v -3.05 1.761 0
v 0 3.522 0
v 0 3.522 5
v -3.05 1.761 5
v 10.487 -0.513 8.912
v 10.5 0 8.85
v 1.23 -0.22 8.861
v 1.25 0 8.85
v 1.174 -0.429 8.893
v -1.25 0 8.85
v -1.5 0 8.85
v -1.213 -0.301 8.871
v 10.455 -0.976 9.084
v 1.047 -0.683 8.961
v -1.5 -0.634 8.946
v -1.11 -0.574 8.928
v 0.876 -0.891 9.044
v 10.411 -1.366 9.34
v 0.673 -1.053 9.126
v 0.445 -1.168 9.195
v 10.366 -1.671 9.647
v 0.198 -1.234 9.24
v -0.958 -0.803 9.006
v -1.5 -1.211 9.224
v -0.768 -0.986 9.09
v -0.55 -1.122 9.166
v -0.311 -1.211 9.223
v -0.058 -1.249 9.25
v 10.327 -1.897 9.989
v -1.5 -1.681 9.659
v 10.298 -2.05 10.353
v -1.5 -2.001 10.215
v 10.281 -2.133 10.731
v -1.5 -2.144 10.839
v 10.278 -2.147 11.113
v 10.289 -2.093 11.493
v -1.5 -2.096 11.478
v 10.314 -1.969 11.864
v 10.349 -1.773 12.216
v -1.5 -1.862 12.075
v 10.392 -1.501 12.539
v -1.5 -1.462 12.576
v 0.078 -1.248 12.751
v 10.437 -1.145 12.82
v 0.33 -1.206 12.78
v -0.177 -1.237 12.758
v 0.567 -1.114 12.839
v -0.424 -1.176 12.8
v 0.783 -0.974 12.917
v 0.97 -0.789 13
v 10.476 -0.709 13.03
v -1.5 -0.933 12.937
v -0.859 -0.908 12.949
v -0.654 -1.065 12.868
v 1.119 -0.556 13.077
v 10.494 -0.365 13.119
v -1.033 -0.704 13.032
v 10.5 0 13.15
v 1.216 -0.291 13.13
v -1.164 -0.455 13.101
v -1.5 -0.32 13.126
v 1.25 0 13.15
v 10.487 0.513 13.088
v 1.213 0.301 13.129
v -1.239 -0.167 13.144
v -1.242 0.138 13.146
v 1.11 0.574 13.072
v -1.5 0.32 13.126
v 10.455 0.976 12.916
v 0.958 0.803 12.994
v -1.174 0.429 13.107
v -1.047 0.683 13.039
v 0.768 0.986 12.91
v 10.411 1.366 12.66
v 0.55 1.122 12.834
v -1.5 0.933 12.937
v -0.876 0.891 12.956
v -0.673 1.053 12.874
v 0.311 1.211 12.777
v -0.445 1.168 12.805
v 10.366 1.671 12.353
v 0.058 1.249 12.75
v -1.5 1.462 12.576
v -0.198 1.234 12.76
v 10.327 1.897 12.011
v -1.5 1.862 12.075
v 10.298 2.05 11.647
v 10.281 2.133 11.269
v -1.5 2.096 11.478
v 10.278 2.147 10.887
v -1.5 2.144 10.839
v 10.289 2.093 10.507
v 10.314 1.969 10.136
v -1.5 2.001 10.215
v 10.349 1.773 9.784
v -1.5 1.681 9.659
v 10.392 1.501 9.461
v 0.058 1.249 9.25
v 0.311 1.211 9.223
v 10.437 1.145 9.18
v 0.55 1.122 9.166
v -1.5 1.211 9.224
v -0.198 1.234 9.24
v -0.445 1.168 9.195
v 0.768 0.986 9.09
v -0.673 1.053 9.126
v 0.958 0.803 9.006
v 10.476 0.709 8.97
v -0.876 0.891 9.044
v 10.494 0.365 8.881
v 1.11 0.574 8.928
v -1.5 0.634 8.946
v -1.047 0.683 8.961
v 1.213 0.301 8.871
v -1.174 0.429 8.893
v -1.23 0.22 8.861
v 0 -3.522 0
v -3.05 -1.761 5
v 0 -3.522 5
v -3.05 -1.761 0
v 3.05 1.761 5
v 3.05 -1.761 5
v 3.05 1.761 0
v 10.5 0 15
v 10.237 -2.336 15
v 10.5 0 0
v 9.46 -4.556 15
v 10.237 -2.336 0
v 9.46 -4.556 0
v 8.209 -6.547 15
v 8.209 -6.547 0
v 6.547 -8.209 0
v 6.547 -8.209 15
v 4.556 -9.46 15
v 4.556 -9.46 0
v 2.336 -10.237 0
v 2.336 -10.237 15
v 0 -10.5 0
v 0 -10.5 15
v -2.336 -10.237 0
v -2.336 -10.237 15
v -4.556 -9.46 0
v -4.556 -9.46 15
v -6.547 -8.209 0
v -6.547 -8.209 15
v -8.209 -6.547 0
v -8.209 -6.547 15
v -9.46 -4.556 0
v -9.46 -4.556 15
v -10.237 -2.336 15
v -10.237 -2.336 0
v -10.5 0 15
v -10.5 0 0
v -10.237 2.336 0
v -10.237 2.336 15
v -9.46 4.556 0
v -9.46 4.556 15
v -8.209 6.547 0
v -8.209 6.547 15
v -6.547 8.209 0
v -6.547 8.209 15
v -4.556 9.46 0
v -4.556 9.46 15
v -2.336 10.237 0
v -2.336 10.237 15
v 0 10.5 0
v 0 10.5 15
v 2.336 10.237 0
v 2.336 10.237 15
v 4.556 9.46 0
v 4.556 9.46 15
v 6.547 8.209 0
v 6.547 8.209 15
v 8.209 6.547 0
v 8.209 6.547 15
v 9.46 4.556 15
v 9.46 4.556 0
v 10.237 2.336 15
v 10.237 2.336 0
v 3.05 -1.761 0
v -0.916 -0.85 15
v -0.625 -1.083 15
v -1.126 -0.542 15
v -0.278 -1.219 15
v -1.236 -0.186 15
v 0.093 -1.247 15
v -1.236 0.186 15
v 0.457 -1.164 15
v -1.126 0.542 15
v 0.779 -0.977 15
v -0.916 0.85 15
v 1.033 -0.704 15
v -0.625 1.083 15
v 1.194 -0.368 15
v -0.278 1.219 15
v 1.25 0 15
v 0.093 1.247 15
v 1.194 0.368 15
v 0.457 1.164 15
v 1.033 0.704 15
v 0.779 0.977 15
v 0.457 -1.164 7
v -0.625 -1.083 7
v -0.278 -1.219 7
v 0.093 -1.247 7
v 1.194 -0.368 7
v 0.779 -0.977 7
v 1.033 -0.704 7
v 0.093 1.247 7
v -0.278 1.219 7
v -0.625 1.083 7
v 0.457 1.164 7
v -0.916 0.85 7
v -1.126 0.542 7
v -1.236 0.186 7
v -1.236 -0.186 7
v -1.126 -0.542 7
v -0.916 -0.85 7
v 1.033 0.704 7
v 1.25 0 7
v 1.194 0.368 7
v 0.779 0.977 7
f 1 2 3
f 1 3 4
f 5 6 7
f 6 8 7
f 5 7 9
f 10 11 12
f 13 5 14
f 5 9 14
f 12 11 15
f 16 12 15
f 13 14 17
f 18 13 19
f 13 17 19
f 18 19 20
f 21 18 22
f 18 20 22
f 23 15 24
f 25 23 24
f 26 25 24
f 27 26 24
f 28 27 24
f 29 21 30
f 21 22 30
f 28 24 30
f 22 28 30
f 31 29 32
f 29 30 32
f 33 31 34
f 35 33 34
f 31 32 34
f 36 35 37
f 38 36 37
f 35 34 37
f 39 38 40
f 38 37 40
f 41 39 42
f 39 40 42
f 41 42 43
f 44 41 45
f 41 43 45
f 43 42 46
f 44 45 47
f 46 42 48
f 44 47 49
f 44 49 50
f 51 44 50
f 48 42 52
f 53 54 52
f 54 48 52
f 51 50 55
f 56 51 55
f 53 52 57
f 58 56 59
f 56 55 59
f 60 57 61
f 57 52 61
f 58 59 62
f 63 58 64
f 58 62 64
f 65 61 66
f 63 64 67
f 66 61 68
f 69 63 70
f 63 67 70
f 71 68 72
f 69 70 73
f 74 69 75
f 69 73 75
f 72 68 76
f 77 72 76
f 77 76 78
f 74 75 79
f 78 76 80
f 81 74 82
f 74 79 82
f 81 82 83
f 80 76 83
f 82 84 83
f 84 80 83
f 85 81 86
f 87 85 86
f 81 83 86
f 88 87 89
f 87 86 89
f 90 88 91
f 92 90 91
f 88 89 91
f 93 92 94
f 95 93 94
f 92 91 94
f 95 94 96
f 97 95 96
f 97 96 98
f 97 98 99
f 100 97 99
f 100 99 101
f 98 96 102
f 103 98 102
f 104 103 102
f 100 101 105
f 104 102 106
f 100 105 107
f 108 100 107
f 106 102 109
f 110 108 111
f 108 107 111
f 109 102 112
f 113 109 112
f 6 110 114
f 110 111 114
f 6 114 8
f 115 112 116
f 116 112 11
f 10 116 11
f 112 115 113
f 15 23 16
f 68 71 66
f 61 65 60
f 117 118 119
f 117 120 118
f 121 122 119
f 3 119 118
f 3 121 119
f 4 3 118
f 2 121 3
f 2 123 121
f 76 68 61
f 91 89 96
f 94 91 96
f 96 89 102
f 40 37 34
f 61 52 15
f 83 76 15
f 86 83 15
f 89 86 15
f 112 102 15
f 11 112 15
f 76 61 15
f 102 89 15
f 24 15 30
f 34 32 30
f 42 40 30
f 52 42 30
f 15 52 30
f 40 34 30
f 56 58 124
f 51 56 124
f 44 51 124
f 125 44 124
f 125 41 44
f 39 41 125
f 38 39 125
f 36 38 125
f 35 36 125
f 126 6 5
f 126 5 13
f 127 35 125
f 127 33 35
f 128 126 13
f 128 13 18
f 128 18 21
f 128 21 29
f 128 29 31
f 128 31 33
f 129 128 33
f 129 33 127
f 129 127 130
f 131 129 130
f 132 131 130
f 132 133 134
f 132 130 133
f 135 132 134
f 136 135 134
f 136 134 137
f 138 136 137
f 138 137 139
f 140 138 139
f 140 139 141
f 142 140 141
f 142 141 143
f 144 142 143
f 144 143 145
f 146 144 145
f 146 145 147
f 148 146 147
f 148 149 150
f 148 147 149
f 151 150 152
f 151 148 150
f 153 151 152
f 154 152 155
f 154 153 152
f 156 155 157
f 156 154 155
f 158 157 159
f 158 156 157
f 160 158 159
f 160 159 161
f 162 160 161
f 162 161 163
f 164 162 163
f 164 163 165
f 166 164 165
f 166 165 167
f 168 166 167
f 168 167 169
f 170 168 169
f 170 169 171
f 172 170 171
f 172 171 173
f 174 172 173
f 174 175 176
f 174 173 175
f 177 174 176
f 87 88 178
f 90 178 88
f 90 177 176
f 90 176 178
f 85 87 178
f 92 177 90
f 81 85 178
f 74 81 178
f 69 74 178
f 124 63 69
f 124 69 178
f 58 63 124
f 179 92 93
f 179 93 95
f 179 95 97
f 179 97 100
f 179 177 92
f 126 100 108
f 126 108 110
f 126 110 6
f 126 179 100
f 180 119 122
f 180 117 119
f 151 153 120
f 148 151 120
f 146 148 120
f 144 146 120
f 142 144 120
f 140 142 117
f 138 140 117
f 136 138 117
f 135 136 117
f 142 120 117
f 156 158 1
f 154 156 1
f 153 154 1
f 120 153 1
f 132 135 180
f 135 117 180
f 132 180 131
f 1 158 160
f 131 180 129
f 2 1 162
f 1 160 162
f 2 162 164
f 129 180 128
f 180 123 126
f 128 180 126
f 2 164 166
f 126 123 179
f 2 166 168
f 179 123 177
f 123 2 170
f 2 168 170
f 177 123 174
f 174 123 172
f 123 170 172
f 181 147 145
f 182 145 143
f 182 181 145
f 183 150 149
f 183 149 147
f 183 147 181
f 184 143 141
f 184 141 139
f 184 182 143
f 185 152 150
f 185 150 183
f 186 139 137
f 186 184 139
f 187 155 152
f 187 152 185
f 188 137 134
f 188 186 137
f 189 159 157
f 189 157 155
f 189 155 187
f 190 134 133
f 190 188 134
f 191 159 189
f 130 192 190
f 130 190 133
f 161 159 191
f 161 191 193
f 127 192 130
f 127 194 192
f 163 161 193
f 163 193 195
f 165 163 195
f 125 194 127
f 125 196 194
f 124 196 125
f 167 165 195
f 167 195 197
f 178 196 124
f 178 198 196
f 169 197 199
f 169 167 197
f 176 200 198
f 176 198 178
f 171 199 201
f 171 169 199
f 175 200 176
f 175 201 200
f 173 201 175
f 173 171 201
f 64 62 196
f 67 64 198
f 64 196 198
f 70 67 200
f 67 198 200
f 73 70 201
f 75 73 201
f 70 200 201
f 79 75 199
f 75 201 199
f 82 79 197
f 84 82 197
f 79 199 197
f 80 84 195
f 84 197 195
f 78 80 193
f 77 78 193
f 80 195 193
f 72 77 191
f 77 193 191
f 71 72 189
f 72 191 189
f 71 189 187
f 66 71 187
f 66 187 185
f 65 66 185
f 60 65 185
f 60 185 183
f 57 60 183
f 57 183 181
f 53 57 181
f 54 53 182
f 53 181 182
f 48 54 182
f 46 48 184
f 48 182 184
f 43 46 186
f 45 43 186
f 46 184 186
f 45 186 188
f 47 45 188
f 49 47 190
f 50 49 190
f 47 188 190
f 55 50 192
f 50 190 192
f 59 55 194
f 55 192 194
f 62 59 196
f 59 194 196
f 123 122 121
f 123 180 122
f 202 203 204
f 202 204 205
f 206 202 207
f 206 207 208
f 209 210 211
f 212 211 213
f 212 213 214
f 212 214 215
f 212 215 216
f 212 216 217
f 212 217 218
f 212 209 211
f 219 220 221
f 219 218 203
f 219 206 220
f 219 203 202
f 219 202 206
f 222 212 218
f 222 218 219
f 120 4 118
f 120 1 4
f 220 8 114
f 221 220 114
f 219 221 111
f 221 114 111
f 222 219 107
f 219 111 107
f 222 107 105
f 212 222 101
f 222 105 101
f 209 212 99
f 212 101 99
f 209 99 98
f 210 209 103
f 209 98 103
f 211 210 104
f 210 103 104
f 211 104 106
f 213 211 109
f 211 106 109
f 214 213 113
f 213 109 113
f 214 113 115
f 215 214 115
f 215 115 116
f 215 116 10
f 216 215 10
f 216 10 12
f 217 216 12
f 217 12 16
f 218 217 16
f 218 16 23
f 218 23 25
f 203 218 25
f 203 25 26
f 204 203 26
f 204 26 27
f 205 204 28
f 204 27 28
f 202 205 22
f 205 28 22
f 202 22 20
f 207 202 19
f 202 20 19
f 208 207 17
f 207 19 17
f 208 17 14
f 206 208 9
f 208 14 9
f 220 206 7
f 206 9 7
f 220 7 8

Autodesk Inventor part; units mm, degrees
ref_plane "YZ Plane" through (0, 0, 0) normal (1, 0, 0) x (0, 1, 0)
ref_plane "XZ Plane" through (0, 0, 0) normal (0, 1, 0) x (-1, 0, 0)
sketch "Boceto1" plane through (0, 0, 0) normal (0, 0, 1) x (1, 0, 0)
  circle A0 centre (0, 0) radius 10.5
  dimension "d0" = 21
extrude "Extrusión1" add sketch "Boceto1" along normal blind 15
sketch "Boceto2" plane through (0, 0, 15) normal (0, 0, 1) x (1, 0, 0)
  circle A0 centre (0, 0) radius 1.25
  dimension "d3" = 2.5
extrude "Extrusión2" cut sketch "Boceto2" against normal blind 8
sketch "Boceto3" plane through (0, 0, 0) normal (0, 0, -1) x (-1, 0, 0)
  line L0 (0, 3.5218) -> (3.05, 1.7609)
  line L1 (3.05, 1.7609) -> (3.05, -1.7609)
  line L2 (3.05, -1.7609) -> (0, -3.5218)
  line L3 (0, -3.5218) -> (-3.05, -1.7609)
  line L4 (-3.05, -1.7609) -> (-3.05, 1.7609)
  line L5 (-3.05, 1.7609) -> (0, 3.5218)
  point P0 (0, 0)
  point P1 (0, 0)
  point P2 (3.05, 0)
  dimension "d6" = 6.1
extrude "Extrusión3" cut sketch "Boceto3" against normal blind 5
ref_plane "Plano de trabajo1" through (10.5, 0, 0) normal (-1, 0, 0) x (0, 0, 1)
sketch "Boceto4" plane through (10.5, 0, 0) normal (-1, 0, 0) x (0, 0, 1)
  circle A0 centre (11, 0) radius 2
  line L0 (15, -10.5) -> (15, 10.5) projected
  point P0 (0, 0)
  dimension "d11" = 4
  dimension "d12" = 4
hole "Agujero1" at (10.5, 0, 11) direction (-1, 0, 0) diameter 4.3 depth 12
properties part number "AcopleMotor"
